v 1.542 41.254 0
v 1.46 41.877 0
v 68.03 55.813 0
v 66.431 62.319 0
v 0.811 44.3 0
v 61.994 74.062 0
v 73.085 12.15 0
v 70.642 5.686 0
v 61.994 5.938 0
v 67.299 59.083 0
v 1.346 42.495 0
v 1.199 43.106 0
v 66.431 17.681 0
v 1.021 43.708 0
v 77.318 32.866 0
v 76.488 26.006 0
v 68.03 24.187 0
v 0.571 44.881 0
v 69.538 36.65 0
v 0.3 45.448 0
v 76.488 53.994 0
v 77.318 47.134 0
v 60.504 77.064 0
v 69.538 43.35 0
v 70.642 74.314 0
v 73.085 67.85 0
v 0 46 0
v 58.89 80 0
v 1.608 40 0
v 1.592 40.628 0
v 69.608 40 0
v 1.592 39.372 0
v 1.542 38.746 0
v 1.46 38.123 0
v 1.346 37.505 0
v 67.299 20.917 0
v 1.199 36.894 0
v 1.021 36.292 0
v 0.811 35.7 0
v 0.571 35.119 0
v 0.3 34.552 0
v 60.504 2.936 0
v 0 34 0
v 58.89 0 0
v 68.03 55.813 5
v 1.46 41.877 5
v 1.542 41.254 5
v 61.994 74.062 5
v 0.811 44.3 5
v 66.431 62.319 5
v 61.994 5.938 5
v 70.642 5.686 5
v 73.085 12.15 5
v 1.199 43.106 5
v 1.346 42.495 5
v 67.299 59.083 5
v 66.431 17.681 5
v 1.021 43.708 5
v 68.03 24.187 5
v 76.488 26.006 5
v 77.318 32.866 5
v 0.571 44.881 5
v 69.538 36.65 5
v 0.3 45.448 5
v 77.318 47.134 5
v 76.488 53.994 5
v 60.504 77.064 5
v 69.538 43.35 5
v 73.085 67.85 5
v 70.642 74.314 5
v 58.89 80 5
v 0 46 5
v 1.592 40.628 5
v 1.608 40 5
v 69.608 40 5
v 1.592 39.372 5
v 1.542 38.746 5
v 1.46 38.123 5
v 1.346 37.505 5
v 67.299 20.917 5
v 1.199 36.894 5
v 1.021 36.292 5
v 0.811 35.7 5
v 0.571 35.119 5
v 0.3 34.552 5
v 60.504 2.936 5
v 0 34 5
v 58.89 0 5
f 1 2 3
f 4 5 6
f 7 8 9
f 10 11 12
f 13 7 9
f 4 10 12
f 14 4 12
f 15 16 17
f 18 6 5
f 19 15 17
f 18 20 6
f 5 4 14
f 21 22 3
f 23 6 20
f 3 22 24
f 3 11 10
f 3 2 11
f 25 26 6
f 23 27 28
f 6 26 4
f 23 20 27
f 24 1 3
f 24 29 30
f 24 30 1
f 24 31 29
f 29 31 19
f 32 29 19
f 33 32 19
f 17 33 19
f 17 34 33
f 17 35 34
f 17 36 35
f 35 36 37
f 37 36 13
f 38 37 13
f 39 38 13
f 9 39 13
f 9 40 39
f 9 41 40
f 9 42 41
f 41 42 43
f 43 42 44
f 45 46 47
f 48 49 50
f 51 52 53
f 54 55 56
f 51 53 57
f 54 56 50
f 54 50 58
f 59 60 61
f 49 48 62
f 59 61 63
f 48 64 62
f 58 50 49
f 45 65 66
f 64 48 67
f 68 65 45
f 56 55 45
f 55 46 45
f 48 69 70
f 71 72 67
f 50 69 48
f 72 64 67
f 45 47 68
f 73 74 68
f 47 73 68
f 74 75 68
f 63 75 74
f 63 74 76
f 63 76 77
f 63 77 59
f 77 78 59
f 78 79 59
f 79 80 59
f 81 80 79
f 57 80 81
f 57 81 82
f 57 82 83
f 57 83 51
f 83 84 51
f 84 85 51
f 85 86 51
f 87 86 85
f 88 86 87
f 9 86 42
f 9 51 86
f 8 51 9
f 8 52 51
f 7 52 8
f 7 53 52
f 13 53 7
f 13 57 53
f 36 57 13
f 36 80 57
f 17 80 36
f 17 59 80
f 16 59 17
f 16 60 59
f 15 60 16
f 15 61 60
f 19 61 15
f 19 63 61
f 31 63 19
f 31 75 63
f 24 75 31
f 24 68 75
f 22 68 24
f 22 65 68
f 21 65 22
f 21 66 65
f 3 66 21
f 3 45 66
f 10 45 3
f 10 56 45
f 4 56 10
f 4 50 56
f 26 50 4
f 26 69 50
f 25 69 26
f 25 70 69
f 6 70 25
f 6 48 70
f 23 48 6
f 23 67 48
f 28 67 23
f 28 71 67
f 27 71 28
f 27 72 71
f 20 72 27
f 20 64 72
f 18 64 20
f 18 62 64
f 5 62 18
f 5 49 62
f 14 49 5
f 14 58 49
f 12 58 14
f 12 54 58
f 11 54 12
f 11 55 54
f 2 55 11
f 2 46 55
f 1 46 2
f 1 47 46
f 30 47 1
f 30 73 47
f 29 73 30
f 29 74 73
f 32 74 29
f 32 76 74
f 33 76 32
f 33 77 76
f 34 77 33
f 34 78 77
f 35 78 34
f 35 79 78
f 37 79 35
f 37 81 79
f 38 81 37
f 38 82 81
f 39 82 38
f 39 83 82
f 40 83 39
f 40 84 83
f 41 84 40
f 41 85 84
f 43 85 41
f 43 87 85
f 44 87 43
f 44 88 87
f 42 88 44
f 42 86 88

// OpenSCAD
$fn = 32;

// ----------------------------------------------------------------------
// Gear sector: 4 teeth on 60 degrees
// ----------------------------------------------------------------------

// --- parameters (mm) ---
sector_angle = 60;        // sector angle, degrees
root_r = 80;              // root circle radius
tooth_h = 8;              // tooth height over the root circle
teeth = 4;                // number of teeth on the sector
hub_r = 12;               // hub bore radius
plate_t = 5;              // sector thickness, Z
arc_step = 3;             // sampling step of the root/hub arcs, degrees

tip_r = root_r + tooth_h;  // tip circle radius

profile = [[58.89, 0], [60.504, 2.936], [61.994, 5.938], [70.642, 5.686], [73.085, 12.15], [66.431, 17.681], [67.299, 20.917], [68.03, 24.187], [76.488, 26.006], [77.318, 32.866], [69.538, 36.65], [69.608, 40], [69.538, 43.35], [77.318, 47.134], [76.488, 53.994], [68.03, 55.813], [67.299, 59.083], [66.431, 62.319], [73.085, 67.85], [70.642, 74.314], [61.994, 74.062], [60.504, 77.064], [58.89, 80], [0, 46], [0.3, 45.448], [0.571, 44.881], [0.811, 44.3], [1.021, 43.708], [1.199, 43.106], [1.346, 42.495], [1.46, 41.877], [1.542, 41.254], [1.592, 40.628], [1.608, 40], [1.592, 39.372], [1.542, 38.746], [1.46, 38.123], [1.346, 37.505], [1.199, 36.894], [1.021, 36.292], [0.811, 35.7], [0.571, 35.119], [0.3, 34.552], [0, 34]];  // primary outline, 44 points, counter clockwise

// --- the one profile operation ---
linear_extrude(height = plate_t) polygon(points = profile);
